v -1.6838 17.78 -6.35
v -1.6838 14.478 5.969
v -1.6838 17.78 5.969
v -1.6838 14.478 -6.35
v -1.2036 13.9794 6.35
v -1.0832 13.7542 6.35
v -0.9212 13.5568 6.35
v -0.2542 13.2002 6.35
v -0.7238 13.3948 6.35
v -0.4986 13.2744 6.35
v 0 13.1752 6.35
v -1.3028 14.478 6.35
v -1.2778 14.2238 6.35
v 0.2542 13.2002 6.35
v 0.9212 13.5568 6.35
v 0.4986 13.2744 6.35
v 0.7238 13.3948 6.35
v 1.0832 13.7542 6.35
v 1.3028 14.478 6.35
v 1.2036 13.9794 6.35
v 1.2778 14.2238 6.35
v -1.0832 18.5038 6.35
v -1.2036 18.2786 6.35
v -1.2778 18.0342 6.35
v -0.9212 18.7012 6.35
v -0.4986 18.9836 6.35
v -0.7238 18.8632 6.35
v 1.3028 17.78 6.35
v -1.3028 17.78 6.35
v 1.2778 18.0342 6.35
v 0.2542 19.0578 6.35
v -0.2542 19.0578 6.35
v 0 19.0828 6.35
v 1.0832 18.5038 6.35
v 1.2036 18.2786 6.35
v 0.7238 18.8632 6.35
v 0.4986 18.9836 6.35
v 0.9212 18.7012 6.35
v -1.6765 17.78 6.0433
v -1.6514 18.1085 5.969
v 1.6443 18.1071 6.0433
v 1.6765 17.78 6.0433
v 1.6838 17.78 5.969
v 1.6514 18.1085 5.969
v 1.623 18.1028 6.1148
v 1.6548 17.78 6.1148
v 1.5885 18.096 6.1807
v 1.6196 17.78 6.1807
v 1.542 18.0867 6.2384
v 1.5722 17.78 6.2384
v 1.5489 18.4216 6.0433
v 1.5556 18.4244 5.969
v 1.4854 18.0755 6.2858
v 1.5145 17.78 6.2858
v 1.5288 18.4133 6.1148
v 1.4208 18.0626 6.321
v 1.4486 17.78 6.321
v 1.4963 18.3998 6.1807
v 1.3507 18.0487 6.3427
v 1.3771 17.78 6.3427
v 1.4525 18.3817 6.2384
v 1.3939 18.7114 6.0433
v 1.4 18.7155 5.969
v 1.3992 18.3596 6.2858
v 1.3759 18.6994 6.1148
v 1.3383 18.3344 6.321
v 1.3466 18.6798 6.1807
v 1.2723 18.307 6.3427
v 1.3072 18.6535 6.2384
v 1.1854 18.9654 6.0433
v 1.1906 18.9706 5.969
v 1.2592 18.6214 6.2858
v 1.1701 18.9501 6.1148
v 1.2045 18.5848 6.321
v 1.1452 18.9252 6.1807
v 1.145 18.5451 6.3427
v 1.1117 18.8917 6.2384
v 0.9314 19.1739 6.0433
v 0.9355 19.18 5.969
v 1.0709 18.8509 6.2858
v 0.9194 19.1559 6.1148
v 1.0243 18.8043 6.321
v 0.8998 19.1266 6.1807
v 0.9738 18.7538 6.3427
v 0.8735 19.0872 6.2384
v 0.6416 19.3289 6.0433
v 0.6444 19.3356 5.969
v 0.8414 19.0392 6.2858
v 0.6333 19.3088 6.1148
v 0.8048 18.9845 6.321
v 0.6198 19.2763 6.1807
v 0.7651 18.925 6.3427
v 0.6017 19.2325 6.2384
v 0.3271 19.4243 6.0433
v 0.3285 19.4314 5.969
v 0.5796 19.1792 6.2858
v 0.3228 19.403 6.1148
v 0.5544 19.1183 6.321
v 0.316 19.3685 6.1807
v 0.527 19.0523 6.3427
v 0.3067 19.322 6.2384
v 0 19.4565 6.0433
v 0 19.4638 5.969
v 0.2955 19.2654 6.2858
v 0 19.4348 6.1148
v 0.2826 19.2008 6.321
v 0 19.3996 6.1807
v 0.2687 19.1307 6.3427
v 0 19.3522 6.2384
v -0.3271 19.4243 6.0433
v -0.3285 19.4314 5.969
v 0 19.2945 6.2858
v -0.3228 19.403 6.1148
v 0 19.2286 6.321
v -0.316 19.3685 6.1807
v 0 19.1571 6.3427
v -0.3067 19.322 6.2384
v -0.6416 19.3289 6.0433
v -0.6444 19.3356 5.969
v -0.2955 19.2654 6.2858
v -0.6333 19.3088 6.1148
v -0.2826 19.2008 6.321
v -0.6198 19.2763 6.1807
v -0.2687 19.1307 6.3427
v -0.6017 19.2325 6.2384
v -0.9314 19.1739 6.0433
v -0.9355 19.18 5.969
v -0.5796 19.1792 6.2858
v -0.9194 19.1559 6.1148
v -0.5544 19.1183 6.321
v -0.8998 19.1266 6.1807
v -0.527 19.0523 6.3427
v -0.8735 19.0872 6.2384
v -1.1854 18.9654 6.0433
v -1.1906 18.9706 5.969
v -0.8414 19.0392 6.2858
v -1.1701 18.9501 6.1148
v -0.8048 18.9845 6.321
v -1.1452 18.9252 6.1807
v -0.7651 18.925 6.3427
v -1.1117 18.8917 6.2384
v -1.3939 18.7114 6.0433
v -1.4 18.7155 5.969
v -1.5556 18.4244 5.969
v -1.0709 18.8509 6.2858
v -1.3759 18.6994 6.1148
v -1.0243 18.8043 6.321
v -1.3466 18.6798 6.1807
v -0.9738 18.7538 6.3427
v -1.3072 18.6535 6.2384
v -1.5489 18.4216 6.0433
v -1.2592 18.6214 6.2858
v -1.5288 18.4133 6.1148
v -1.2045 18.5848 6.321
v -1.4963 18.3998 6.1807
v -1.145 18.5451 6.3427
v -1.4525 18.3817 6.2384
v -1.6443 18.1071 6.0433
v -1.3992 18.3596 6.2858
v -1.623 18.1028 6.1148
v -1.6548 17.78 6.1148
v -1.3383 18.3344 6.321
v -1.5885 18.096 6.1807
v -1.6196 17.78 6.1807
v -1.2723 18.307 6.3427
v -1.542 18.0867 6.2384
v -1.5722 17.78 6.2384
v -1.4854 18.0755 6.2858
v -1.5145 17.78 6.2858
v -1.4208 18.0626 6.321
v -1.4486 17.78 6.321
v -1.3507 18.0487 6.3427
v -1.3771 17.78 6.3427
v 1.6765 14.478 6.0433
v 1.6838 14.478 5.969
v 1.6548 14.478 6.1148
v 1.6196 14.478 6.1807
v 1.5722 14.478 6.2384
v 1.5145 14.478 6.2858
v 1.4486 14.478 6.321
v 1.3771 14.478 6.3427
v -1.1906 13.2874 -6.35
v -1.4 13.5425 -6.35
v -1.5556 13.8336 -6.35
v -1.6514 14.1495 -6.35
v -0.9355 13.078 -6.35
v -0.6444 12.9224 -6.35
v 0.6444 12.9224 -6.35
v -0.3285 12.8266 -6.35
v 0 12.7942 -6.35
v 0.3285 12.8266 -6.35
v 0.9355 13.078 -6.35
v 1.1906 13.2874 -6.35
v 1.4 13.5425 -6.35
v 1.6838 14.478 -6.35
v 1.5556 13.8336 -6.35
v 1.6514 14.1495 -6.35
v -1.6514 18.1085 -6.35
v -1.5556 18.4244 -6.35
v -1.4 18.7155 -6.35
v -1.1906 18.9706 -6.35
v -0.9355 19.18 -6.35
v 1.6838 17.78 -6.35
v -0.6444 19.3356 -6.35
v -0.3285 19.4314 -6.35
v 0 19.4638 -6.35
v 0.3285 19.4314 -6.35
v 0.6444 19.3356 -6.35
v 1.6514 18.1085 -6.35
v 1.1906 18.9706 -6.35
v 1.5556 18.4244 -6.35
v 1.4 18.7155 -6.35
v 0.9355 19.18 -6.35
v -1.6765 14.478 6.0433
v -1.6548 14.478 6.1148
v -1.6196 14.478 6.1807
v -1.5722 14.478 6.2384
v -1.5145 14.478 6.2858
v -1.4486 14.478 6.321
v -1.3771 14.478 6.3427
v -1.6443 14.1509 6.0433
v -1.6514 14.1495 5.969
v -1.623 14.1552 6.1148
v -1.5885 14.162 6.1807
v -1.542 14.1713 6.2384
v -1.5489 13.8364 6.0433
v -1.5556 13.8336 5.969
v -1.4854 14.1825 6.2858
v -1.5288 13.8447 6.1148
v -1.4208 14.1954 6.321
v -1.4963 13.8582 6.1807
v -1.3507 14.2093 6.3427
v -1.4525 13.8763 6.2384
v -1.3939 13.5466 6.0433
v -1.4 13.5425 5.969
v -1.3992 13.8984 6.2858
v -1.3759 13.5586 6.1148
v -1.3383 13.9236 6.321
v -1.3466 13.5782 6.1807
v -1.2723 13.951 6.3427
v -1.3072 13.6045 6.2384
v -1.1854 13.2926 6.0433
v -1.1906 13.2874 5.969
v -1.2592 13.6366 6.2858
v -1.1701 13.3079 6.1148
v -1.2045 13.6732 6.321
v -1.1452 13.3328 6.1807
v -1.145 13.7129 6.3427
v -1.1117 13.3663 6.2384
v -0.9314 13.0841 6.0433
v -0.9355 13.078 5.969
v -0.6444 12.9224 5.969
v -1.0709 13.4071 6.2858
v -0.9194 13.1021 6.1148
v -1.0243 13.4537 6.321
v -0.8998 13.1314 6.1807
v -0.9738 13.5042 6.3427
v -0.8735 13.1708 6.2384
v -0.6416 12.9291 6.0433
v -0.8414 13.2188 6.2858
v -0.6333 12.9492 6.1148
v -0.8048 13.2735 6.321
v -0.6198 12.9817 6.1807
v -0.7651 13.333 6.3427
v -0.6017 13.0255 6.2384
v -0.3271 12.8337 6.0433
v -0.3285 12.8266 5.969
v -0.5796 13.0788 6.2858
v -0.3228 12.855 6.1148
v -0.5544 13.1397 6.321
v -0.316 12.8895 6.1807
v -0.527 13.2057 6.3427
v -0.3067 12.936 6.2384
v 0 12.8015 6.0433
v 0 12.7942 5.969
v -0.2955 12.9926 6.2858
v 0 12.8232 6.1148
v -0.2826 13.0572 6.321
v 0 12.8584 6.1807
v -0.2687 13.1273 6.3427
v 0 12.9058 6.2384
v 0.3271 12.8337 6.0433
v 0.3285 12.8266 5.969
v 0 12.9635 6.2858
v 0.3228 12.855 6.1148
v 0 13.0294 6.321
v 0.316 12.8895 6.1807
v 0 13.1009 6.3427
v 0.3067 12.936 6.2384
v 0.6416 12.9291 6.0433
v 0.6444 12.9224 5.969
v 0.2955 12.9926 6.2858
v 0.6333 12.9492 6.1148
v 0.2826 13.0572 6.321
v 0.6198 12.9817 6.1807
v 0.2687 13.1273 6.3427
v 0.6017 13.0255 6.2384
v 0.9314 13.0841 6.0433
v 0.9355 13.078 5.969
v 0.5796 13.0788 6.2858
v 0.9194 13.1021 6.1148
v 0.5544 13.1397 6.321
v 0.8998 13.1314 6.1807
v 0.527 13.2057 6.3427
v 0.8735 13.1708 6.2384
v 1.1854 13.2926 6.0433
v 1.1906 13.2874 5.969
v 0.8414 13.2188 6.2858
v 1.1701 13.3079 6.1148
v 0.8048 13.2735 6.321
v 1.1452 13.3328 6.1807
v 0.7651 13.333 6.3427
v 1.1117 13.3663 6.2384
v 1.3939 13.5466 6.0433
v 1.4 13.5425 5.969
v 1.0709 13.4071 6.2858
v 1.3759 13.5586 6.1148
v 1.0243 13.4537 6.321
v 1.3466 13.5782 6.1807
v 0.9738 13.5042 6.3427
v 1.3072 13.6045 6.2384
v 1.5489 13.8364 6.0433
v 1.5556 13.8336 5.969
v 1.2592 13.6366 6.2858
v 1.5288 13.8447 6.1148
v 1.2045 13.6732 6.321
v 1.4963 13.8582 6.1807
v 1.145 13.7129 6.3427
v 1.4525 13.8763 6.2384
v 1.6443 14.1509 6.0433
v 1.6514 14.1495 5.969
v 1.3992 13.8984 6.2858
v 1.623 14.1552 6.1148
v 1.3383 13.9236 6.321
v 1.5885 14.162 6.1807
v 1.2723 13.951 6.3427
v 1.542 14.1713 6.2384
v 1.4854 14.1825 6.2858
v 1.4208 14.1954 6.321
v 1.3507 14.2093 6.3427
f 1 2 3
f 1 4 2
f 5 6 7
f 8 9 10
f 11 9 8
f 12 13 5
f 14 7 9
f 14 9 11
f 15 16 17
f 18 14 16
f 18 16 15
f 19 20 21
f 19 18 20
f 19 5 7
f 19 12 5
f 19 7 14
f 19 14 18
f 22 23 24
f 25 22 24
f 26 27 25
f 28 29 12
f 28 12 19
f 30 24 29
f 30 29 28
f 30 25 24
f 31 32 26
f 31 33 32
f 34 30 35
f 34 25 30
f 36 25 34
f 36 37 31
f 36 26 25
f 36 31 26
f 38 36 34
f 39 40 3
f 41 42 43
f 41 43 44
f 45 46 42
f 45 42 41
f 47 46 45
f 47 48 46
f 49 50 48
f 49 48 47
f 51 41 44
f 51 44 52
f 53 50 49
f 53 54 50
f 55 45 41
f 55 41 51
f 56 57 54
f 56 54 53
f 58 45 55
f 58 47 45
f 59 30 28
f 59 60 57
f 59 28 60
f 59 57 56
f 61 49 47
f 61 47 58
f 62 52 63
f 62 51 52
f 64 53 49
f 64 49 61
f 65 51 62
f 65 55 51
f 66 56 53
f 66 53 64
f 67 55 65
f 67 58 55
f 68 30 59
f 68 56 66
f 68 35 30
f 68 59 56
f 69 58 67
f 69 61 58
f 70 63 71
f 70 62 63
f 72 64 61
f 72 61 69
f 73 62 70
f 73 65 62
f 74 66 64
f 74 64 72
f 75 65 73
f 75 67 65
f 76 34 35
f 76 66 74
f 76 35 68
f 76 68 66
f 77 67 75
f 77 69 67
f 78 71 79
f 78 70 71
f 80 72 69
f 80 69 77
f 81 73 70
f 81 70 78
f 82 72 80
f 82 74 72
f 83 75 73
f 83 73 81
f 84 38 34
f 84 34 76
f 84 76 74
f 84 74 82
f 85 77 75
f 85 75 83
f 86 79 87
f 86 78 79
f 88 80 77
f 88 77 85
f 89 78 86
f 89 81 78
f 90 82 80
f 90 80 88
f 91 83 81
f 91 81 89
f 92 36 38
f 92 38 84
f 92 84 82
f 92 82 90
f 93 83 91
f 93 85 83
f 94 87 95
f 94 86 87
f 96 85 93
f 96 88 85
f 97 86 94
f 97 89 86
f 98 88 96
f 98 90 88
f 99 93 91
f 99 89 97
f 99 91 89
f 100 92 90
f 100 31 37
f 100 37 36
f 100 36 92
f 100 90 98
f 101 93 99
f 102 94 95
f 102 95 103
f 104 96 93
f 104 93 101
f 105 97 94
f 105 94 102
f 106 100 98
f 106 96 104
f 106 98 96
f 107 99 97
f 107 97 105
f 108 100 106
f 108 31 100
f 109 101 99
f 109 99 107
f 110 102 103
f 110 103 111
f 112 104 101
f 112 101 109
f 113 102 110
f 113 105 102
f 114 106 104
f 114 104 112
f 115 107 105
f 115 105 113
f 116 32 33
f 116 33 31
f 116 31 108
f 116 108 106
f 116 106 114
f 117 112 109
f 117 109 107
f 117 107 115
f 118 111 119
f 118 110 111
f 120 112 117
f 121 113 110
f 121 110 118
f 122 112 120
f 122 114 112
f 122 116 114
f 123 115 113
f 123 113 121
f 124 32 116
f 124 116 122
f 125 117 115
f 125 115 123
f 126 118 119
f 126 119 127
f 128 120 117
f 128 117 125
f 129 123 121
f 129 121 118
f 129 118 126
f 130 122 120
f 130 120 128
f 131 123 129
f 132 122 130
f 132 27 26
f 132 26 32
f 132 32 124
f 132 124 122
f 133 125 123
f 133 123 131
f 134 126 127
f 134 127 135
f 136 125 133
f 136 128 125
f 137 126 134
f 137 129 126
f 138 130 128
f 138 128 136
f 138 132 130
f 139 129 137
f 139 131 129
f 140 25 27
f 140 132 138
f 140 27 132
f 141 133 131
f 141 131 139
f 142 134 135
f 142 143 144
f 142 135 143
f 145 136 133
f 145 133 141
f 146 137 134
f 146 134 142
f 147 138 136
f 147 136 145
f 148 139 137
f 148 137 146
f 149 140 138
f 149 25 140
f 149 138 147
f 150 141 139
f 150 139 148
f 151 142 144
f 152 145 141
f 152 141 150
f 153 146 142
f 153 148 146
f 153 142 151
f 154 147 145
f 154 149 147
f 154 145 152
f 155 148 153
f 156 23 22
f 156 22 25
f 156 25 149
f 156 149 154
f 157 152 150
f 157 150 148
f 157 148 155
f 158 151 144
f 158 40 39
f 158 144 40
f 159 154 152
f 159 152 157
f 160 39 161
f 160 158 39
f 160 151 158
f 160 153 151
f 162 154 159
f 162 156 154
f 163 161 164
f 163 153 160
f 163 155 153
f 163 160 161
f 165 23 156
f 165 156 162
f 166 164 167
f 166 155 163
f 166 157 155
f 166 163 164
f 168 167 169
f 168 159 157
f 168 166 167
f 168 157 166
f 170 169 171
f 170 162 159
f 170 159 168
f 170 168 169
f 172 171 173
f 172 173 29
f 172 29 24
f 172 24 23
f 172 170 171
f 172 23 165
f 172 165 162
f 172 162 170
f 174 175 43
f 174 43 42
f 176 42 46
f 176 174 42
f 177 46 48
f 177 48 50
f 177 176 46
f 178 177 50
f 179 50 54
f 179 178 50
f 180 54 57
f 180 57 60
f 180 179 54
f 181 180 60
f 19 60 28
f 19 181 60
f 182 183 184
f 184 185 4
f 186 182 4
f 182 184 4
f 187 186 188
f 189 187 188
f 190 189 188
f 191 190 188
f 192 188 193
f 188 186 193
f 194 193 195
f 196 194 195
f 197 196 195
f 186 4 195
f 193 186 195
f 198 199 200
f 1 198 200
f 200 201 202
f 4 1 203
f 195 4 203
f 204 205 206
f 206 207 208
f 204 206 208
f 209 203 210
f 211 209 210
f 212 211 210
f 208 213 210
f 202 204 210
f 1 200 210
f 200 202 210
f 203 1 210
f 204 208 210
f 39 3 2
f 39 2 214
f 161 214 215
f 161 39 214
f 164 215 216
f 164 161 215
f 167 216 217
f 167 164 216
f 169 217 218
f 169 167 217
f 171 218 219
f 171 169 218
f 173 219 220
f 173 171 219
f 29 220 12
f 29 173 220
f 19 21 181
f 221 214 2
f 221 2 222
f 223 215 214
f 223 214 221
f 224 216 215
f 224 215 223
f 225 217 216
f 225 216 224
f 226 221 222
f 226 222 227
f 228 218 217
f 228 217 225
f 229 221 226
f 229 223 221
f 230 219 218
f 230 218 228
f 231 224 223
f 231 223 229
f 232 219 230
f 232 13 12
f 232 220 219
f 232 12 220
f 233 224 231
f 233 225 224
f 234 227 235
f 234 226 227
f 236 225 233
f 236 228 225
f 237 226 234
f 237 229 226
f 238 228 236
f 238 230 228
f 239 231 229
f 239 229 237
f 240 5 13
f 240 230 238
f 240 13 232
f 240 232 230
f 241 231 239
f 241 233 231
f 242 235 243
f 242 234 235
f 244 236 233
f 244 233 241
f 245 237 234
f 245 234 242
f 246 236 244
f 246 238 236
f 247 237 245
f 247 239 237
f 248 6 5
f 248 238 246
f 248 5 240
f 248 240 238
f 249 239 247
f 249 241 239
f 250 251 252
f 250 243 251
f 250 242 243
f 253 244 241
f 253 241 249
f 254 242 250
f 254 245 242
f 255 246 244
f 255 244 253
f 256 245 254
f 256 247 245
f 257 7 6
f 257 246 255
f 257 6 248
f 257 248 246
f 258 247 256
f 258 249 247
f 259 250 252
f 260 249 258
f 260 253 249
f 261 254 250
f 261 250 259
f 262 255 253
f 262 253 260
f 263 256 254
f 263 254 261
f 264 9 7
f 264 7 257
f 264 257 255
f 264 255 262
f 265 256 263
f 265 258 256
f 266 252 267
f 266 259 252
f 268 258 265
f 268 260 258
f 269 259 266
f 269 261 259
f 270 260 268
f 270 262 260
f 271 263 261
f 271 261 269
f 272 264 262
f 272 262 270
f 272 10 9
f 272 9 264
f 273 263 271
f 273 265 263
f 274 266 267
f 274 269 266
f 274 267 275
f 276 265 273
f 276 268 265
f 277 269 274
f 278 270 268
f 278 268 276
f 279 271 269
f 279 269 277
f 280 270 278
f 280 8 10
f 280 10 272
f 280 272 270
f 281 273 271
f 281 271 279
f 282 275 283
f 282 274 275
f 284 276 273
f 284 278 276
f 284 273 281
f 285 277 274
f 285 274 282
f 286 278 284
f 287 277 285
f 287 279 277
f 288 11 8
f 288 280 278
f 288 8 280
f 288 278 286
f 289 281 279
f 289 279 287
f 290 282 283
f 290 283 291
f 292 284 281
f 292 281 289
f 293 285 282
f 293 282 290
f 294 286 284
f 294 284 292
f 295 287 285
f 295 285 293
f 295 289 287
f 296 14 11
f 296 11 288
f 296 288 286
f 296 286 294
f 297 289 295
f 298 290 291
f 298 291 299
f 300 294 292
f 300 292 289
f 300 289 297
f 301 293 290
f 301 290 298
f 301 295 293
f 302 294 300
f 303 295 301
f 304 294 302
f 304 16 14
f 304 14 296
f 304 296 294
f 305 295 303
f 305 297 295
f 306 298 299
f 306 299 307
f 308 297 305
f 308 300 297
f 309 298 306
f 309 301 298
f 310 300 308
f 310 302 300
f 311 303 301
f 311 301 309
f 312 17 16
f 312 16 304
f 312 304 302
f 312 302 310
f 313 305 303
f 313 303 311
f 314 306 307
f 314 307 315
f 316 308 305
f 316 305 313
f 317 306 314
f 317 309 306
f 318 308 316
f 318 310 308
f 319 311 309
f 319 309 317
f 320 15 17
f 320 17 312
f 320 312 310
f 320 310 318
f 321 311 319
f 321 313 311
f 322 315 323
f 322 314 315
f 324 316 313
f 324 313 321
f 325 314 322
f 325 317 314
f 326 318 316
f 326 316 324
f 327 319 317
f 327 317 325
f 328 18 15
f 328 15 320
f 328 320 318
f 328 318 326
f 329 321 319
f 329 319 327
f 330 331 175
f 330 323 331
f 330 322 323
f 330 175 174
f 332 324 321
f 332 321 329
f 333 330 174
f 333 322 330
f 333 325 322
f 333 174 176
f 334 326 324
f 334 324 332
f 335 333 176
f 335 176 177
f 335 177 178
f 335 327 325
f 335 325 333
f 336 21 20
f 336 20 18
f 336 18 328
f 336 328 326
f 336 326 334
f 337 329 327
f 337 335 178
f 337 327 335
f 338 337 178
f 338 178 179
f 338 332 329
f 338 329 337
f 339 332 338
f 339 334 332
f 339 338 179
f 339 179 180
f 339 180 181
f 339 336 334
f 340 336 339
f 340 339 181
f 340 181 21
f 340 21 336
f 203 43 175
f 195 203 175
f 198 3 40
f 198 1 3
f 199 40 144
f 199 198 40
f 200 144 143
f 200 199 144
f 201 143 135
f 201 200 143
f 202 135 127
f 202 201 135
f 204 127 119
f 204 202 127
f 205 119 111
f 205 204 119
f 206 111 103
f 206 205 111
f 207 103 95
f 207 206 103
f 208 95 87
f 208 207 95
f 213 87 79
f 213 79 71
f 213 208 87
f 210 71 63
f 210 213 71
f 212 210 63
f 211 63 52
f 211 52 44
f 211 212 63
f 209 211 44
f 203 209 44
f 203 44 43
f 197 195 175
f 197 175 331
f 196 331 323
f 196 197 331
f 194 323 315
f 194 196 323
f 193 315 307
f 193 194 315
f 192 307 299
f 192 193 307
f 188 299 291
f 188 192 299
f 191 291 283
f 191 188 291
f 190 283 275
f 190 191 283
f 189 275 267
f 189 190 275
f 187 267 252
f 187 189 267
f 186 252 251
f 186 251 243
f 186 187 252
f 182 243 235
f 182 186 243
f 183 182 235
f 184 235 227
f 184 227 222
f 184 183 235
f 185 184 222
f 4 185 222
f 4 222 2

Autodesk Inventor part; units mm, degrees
ref_plane "YZ Plane" through (0, 0, 0) normal (1, 0, 0) x (0, 1, 0)
ref_plane "XZ Plane" through (0, 0, 0) normal (0, 1, 0) x (-1, 0, 0)
ref_plane "XY Plane" through (0, 0, 0) normal (0, 0, 1) x (1, 0, 0)
sketch "Sketch1" plane through (0, 0, 0) normal (0, 0, 1) x (1, 0, 0)
  arc A0 (-2.159, 14.478) -> (2.159, 14.478) centre (0, 14.478) ccw projected
  line L0 (-2.159, 14.478) -> (-2.159, 17.78) projected
  arc A1 (2.159, 17.78) -> (-2.159, 17.78) centre (0, 17.78) ccw projected
  line L1 (2.159, 17.78) -> (2.159, 14.478) projected
  line L2 (-3.81, -17.78) -> (-3.81, 17.78) projected
  arc A2 (-3.81, -17.78) -> (3.81, -17.78) centre (0, -17.78) ccw projected
  line L3 (3.81, 17.78) -> (3.81, -17.78) projected
  arc A3 (3.81, 17.78) -> (-3.81, 17.78) centre (0, 17.78) ccw projected
  arc A4 (-1.6838, 14.478) -> (1.6838, 14.478) centre (0, 14.478) ccw
  line L4 (-1.6838, 14.478) -> (-1.6838, 17.78)
  arc A5 (1.6838, 17.78) -> (-1.6838, 17.78) centre (0, 17.78) ccw
  line L5 (1.6838, 17.78) -> (1.6838, 14.478)
extrude "Extrusion1" add sketch "Sketch1" along normal mid plane 12.7 contours L4 A5 L5 A4
fillet "Fillet1" radius 0.381 4 edges at (-1.6838, 16.129, 6.35) (0, 19.4638, 6.35) (1.6838, 16.129, 6.35) (0, 12.7942, 6.35)
ref_plane "Work Plane1" through (0, 14.478, -6.35) normal (1, 0, 0) x (0, 0, -1)
ref_plane "Work Plane2" through (1.3028, 16.129, 6.35) normal (0, 1, 0) x (-1, 0, 0)
properties part number "BUSS-SAFTY-TRIP"
